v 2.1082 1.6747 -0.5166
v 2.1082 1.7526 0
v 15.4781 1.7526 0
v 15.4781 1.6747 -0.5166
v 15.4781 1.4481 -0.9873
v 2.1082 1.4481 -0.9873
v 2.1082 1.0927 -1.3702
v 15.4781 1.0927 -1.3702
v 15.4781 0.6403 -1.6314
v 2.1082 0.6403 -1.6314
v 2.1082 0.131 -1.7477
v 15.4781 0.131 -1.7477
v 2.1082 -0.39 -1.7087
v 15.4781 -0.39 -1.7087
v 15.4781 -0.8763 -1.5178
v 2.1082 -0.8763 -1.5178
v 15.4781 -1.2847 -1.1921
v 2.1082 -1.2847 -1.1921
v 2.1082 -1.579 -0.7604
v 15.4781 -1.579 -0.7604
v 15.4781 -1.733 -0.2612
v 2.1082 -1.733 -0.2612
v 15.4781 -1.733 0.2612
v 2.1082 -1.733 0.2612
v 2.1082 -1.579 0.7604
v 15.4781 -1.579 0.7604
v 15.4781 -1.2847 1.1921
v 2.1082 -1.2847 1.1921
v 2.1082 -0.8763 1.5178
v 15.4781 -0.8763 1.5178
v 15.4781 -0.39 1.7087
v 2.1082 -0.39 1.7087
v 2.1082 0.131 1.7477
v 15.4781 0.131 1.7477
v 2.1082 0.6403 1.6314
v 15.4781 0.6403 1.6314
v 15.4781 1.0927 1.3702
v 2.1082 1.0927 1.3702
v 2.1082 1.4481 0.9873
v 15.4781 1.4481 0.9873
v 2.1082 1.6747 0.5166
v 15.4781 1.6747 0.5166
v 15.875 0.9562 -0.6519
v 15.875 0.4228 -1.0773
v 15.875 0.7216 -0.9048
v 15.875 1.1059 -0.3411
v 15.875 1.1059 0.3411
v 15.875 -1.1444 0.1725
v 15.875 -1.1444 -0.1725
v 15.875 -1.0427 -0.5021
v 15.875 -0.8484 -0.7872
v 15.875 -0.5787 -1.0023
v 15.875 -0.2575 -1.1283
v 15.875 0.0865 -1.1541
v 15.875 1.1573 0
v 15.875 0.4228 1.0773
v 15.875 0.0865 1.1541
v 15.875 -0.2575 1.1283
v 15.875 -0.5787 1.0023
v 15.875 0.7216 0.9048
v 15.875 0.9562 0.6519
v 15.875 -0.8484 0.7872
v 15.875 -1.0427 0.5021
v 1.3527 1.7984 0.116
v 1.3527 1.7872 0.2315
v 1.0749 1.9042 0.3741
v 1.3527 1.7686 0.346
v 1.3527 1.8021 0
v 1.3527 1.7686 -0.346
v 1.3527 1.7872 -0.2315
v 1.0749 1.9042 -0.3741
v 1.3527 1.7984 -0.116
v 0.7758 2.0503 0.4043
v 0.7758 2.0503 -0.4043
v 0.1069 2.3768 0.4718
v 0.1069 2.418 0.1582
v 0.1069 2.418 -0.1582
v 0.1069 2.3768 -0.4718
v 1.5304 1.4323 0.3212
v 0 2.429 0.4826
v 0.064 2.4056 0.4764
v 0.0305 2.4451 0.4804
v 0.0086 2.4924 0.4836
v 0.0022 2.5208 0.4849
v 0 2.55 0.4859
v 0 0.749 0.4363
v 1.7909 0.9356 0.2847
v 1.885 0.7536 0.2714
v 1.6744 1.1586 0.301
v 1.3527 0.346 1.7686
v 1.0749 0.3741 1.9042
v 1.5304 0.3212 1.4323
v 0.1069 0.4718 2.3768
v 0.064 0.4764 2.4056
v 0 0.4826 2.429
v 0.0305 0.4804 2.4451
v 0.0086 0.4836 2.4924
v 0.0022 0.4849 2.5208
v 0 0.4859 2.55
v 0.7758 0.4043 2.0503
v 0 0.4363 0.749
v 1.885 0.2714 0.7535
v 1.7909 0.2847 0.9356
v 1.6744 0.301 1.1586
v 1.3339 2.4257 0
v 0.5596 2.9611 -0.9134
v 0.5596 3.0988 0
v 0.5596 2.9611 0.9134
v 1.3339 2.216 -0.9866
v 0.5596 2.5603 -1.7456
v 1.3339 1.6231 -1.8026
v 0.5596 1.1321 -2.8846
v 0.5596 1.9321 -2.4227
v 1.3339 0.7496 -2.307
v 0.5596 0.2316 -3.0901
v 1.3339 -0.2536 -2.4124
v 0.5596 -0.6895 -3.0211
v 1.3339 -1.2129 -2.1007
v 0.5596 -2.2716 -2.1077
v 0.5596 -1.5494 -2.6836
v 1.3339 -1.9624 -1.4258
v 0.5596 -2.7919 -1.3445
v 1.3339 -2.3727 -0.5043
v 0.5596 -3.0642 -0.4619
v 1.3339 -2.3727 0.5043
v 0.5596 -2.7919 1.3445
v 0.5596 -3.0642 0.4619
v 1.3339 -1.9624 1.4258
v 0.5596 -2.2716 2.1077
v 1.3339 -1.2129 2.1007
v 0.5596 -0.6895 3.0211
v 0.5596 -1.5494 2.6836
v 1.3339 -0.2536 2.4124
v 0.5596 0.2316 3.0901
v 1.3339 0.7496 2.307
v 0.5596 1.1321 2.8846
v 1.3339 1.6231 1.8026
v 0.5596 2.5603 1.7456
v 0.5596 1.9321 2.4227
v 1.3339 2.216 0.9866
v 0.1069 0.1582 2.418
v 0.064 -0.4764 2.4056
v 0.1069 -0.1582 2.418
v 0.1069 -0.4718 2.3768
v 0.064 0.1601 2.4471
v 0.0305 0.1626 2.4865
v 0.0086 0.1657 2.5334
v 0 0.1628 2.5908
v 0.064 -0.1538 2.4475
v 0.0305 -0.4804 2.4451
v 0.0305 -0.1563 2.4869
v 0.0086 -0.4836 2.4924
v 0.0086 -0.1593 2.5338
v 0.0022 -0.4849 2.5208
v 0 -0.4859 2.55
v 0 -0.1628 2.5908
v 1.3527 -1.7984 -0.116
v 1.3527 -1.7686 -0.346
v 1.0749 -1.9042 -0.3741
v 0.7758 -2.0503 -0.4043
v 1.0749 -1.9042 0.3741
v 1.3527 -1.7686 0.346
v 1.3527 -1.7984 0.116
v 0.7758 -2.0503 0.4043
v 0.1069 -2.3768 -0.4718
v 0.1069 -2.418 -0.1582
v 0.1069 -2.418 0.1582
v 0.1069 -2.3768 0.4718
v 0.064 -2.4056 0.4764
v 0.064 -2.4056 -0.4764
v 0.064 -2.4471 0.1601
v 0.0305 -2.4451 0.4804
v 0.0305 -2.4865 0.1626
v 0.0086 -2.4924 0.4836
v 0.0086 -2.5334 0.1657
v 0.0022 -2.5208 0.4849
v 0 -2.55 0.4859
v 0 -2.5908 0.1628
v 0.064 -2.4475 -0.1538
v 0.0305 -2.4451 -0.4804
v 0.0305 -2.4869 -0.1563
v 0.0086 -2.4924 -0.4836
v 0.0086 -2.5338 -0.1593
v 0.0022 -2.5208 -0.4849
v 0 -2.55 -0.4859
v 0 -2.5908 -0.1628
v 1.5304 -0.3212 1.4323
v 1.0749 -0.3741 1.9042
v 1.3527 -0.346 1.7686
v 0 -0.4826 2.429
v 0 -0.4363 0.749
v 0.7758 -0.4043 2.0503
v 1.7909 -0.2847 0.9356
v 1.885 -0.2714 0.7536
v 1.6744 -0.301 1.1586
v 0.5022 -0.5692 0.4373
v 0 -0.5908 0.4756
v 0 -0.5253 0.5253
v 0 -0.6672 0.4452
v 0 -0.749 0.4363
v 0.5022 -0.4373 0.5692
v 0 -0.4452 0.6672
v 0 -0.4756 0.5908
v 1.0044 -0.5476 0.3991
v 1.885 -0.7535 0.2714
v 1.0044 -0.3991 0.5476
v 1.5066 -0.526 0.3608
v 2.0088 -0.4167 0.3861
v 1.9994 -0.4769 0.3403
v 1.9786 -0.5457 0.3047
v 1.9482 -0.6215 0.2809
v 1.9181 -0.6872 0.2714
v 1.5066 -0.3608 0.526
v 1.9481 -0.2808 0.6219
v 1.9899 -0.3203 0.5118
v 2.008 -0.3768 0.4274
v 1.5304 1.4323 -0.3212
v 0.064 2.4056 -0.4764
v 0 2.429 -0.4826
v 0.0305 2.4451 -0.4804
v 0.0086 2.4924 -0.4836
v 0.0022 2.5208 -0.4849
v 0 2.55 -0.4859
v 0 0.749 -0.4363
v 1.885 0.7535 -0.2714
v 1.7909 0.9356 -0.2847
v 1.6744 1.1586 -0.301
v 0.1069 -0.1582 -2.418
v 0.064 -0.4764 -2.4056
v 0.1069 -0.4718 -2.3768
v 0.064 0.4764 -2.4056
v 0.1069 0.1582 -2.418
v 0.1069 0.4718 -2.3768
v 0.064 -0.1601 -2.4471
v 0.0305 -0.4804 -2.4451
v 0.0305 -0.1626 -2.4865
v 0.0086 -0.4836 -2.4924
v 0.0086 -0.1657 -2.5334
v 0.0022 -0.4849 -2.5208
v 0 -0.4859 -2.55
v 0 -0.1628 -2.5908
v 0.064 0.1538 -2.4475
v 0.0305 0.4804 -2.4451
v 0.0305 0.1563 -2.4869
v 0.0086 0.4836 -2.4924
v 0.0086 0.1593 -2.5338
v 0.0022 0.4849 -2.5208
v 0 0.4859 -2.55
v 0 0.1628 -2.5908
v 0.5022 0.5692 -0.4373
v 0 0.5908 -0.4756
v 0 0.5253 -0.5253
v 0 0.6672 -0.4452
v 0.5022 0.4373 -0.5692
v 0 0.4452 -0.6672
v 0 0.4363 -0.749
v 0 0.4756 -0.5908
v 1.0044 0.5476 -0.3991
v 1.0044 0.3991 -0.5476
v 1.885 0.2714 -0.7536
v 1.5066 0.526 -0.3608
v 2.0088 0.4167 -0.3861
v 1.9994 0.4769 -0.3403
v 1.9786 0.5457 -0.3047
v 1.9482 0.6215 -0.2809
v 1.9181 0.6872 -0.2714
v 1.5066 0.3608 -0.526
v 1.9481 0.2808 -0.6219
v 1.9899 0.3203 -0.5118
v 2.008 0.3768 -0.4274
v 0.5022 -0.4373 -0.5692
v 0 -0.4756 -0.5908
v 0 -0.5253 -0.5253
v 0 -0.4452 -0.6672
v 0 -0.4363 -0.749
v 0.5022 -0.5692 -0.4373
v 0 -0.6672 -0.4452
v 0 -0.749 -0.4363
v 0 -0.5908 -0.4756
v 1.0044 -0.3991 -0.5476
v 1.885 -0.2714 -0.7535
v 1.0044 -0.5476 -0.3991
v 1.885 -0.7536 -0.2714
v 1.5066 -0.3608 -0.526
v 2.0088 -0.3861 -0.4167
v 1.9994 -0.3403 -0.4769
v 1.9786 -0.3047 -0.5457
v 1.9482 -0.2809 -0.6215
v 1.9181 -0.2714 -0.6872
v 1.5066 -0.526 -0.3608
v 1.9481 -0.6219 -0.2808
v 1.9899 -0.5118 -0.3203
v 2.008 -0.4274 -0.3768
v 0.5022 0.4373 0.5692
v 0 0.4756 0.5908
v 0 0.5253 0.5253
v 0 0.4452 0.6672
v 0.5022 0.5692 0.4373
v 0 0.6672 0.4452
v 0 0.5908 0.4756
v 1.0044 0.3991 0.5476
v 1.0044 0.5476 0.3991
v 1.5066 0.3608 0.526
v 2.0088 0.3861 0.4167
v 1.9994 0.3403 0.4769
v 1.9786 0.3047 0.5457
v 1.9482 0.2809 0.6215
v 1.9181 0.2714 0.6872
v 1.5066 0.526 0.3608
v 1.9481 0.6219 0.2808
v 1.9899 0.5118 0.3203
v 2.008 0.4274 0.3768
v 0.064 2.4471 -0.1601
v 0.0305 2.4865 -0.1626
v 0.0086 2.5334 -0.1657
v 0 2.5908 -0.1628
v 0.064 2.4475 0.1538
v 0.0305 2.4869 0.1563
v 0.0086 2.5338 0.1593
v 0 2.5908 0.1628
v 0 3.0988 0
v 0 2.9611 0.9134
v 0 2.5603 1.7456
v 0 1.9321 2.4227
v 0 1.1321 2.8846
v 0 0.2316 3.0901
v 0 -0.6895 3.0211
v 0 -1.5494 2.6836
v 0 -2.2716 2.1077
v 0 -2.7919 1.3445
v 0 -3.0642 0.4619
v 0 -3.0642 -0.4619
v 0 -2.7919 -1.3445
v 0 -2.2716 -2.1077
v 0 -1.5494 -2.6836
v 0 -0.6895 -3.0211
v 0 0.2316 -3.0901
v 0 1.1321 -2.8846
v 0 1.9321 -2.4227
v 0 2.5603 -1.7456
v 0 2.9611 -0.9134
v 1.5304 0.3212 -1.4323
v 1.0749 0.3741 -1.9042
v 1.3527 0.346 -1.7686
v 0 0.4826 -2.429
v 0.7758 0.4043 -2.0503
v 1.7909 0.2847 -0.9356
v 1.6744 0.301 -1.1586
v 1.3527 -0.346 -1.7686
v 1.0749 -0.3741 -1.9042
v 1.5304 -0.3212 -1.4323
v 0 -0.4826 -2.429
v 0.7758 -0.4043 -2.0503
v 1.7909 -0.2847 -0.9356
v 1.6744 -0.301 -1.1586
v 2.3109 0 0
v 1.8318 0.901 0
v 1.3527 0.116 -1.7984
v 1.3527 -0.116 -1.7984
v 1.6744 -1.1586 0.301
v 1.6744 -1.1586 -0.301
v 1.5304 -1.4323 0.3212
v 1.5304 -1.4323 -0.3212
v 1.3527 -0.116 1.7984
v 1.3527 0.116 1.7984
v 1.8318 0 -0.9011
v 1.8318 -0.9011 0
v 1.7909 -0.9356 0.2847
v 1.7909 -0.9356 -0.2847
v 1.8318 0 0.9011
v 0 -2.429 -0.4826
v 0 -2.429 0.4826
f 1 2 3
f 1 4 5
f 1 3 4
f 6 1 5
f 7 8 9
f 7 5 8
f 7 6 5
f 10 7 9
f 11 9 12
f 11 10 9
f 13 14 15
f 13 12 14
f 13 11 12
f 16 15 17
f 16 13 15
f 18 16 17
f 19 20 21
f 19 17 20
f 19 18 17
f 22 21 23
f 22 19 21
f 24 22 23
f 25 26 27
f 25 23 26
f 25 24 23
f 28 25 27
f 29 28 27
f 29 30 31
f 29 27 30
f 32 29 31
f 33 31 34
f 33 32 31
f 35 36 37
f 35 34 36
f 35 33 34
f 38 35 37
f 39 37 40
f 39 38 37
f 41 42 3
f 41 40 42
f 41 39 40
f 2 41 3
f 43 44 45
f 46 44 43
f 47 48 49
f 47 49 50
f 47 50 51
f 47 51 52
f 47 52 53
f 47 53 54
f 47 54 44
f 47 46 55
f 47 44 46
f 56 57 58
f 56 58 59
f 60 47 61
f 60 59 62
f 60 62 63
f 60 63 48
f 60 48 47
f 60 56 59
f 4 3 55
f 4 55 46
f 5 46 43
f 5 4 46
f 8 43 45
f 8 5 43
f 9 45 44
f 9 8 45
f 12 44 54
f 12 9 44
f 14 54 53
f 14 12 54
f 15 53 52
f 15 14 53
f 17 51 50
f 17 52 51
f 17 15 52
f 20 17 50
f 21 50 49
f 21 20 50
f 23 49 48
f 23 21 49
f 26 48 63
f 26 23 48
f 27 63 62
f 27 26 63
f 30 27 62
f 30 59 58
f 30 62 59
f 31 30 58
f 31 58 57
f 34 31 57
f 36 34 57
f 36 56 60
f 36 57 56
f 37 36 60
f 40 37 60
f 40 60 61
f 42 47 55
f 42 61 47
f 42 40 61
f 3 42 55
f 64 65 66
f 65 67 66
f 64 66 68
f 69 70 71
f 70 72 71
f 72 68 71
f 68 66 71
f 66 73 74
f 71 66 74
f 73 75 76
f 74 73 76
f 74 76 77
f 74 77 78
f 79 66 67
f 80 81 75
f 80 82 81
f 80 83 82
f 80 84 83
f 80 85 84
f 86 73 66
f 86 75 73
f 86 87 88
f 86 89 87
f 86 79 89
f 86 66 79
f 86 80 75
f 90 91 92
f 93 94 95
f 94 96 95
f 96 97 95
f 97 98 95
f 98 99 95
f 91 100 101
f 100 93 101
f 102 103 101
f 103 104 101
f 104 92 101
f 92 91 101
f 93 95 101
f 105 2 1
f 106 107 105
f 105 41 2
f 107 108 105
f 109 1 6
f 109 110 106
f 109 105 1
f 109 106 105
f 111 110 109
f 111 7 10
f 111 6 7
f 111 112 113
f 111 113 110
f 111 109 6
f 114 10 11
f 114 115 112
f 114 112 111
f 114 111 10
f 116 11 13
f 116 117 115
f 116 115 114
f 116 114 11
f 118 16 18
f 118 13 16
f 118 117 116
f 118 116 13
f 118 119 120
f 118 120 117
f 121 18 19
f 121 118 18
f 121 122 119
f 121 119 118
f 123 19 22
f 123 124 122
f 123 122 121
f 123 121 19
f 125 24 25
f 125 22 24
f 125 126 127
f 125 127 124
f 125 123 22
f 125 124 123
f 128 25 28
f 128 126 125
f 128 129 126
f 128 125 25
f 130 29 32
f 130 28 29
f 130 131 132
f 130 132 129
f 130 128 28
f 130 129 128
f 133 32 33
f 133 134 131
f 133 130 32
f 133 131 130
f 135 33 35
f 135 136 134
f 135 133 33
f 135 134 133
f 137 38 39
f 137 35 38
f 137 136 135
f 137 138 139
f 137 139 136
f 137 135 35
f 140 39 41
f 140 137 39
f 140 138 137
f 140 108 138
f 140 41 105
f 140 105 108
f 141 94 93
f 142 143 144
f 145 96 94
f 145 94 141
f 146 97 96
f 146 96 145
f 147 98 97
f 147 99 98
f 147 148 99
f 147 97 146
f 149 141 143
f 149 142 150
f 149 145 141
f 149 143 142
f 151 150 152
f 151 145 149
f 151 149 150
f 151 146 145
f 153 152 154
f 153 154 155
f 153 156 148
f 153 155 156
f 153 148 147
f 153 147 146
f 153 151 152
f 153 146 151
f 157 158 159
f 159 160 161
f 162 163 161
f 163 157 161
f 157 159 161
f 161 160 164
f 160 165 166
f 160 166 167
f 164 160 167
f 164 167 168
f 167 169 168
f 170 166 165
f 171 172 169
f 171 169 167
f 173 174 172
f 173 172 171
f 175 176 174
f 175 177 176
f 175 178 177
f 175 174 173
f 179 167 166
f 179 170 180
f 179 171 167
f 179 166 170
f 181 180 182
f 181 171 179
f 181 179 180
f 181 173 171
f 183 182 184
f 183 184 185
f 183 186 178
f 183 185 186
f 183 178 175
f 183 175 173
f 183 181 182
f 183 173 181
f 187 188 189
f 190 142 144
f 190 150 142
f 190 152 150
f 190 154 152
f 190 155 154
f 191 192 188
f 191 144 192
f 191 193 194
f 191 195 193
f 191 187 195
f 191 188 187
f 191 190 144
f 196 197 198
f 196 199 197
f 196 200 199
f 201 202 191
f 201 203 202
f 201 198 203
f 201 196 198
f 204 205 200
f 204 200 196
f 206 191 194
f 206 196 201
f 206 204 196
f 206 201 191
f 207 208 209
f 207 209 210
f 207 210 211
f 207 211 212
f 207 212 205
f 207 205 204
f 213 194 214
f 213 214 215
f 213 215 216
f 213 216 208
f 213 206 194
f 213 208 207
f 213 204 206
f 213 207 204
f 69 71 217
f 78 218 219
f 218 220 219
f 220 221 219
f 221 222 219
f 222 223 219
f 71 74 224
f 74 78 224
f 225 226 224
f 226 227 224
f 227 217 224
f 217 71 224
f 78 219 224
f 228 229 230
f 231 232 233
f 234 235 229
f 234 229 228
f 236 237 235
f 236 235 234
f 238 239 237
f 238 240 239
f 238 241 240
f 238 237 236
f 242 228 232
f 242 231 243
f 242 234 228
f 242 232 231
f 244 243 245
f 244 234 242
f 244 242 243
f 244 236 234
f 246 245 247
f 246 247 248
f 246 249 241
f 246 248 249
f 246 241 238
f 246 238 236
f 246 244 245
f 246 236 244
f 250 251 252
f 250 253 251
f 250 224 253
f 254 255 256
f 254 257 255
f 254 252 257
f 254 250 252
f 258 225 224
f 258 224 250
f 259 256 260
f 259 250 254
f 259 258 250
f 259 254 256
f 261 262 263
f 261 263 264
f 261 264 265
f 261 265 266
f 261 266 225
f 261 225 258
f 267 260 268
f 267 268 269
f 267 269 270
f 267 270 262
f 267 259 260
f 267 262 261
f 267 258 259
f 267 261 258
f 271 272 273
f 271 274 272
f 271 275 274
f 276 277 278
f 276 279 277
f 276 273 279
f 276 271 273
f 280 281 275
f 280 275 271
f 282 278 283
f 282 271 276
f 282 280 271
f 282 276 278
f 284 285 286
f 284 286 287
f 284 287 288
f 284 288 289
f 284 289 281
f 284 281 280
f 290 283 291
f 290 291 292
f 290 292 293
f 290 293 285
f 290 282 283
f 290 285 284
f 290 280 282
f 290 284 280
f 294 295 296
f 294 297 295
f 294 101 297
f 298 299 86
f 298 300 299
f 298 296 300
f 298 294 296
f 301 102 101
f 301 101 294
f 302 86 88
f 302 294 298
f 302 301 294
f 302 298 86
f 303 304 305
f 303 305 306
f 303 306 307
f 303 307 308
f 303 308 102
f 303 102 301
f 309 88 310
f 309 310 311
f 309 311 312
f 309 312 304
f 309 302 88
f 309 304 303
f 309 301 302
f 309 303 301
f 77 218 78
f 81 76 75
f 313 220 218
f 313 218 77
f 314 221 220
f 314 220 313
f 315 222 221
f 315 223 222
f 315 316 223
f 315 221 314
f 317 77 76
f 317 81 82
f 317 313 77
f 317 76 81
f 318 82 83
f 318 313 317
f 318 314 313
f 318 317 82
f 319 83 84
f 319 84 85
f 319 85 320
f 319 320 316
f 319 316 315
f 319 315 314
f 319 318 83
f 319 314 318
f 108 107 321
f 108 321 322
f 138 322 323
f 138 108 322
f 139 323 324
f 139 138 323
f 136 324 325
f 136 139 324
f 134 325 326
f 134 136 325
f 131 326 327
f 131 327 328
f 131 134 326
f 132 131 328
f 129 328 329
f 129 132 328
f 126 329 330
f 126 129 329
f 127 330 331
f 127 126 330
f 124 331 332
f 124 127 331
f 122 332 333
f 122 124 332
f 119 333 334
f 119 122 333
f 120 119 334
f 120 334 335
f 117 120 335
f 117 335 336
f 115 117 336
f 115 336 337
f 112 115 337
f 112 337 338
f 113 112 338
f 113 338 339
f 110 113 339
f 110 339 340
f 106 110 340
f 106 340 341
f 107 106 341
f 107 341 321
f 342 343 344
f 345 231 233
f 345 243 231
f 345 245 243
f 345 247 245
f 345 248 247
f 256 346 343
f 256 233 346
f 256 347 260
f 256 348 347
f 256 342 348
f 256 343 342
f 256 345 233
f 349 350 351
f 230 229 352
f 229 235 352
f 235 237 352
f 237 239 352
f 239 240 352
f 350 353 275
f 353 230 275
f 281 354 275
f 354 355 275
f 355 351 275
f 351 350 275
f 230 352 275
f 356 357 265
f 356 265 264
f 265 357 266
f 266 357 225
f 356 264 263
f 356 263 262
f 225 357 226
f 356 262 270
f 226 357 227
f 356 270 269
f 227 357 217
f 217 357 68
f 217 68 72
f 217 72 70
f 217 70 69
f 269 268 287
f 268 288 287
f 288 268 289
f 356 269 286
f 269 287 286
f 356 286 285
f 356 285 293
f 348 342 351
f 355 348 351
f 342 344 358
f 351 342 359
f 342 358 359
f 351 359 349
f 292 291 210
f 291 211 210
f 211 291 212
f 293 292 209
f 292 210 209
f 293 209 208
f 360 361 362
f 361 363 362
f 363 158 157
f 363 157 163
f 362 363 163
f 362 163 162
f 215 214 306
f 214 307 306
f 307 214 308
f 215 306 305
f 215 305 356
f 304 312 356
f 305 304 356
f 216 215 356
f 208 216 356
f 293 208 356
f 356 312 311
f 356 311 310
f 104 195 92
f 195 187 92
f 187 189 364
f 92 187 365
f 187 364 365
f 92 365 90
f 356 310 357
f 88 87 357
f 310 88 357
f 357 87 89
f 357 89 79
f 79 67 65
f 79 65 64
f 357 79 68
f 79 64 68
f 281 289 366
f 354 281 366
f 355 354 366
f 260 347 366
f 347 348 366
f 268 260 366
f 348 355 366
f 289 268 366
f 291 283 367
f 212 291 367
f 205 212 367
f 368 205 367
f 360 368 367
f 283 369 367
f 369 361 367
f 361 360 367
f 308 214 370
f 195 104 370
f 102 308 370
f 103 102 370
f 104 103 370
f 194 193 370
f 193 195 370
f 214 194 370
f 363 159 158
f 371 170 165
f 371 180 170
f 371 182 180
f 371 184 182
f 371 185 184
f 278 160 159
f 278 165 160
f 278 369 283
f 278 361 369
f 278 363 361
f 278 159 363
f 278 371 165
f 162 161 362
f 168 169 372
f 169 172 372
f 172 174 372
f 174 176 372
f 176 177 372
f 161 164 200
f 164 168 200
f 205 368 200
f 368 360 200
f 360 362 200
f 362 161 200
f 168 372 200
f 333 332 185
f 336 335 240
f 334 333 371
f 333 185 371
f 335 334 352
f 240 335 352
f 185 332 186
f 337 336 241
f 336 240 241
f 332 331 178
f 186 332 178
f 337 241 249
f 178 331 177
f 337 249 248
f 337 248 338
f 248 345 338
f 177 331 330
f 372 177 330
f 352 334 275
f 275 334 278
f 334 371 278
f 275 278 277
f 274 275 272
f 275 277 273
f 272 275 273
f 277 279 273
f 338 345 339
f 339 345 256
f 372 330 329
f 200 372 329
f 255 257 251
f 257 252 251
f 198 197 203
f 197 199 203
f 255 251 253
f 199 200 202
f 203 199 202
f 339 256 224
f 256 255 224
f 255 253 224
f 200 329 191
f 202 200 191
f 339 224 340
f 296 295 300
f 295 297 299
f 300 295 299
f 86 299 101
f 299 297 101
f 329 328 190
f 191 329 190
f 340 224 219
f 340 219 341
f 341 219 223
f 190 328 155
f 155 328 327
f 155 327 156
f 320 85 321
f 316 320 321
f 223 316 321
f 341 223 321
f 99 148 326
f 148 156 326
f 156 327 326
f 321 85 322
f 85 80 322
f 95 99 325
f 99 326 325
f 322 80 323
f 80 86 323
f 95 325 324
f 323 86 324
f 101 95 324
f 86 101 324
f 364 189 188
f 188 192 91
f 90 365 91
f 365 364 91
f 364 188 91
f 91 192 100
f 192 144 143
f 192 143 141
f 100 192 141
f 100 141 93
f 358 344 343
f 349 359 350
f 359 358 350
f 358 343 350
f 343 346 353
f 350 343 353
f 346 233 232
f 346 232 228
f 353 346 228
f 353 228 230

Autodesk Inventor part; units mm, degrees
ref_plane "YZ Plane" through (0, 0, 0) normal (1, 0, 0) x (0, 1, 0)
ref_plane "XZ Plane" through (0, 0, 0) normal (0, 1, 0) x (-1, 0, 0)
sketch "Sketch1" plane through (0, 0, 0) normal (0, 0, 1) x (1, 0, 0)
  line L0 (2.3109, 0) -> (15.875, 0)
  line L1 (15.875, 0) -> (15.875, 1.7526)
  line L2 (15.875, 1.7526) -> (4.0926, 1.7526)
  line L3 (4.0926, 1.7526) -> (3.2988, 1.7526)
  line L4 (3.2988, 1.7526) -> (2.1082, 1.7526)
  line L5 (0, 3.0988) -> (0, 2.4765)
  line L6 (0, 2.4765) -> (1.3527, 1.8021)
  line L7 (1.3527, 1.8021) -> (2.3109, 0)
  line L8 (-3.175, 0) -> (19.05, 0) projected
  line L9 (0, -0.6198) -> (0, 3.7186) projected
  line L10 (0, 3.0988) -> (0.5596, 3.0988)
  line L11 (0.5596, 3.0988) -> (2.1082, 1.7526)
  line L12 (4.0926, 1.7526) -> (2.1082, 1.7526) construction
  dimension "d1" = 11.7824
  dimension "d2" = 3.5052
  dimension "d3" = 3.5052
  dimension "d4" = 4.953
  dimension "d5" = 26.5
  dimension "d6" = 62
  dimension "d7" = 2.3109
  dimension "d8" = 0.7937
  dimension "d12" = 6.1976
  dimension "d13" = 41
  dimension "d15" = 15.875
  dimension "d24" = 2.1082
revolve "Body" add sketch "Sketch1" angle 360 about axis through (2.3109, 0, 0) along (1, 0, 0) contours L7 L6 L5 L10 L11 L4 L3 L2 L1 L0
sketch "Sketch2" plane through (0, 0, 0) normal (-1, 0, 0) x (0, 0, 1)
  line L0 (0, 2.4765) -> (0, 0) construction
  line L1 (0, 0) -> (2.4765, 0) construction
  arc A0 (0.743, 0) -> (0, 0.7429) centre (0, 0) ccw construction
  arc A1 (0.8668, 0) -> (0, 0.8668) centre (0, 0) ccw construction
  arc A2 (2.429, 0.4826) -> (0.4826, 2.429) centre (0, 0) ccw
  line L2 (0, 0) -> (1.7511, 1.7511) construction
  line L3 (0.4826, 2.429) -> (0.4363, 0.749)
  line L4 (2.429, 0.4826) -> (0.749, 0.4363)
  arc A3 (0.4826, 2.429) -> (0, 2.4765) centre (0, 0) ccw
  arc A4 (2.4765, 0) -> (2.429, 0.4826) centre (0, 0) ccw
  line L5 (0, -4.3383) -> (0, 4.3383) projected
  line L6 (-4.3383, 0) -> (4.3383, 0) projected
  arc A5 (0.4826, -2.429) -> (2.429, -0.4826) centre (0, 0) ccw
  line L7 (0.4826, -2.429) -> (0.4363, -0.749)
  line L8 (2.429, -0.4826) -> (0.749, -0.4363)
  arc A6 (0, -2.4765) -> (0.4826, -2.429) centre (0, 0) ccw
  arc A7 (2.429, -0.4826) -> (2.4765, 0) centre (0, 0) ccw
  arc A8 (-0.4826, 2.429) -> (-2.429, 0.4826) centre (0, 0) ccw
  line L9 (-0.4826, 2.429) -> (-0.4363, 0.749)
  line L10 (-2.429, 0.4826) -> (-0.749, 0.4363)
  arc A9 (0, 2.4765) -> (-0.4826, 2.429) centre (0, 0) ccw
  arc A10 (-2.429, 0.4826) -> (-2.4765, 0) centre (0, 0) ccw
  arc A11 (-0.4826, -2.429) -> (0, -2.4765) centre (0, 0) ccw
  arc A12 (-2.429, -0.4826) -> (-0.4826, -2.429) centre (0, 0) ccw
  arc A13 (-2.4765, 0) -> (-2.429, -0.4826) centre (0, 0) ccw
  line L11 (-2.429, -0.4826) -> (-0.749, -0.4363)
  line L12 (-0.4826, -2.429) -> (-0.4363, -0.749)
  arc A14 (0.4363, 0.749) -> (0.749, 0.4363) centre (0.7406, 0.7406) ccw
  arc A15 (0.749, -0.4363) -> (0.4363, -0.749) centre (0.7406, -0.7406) ccw
  arc A16 (-0.749, 0.4363) -> (-0.4363, 0.749) centre (-0.7406, 0.7406) ccw
  arc A17 (-0.4363, -0.749) -> (-0.749, -0.4363) centre (-0.7406, -0.7406) ccw
  point P0 (1.7511, -1.7511)
  point P1 (-1.7511, 1.7511)
  point P2 (-1.7511, -1.7511)
  dimension "d17" = 1.4859
  dimension "d18" = 1.7335
  dimension "d19" = 4.953
  dimension "d20" = 45
  dimension "d21" = 0.4826
extrude "Slot" add sketch "Sketch2" against normal up to next draft 5 contours L4 A14 L3 A2 | A5 L7 A15 L8 | L9 A16 L10 A8 | A12 L11 A17 L12
fillet "Fillet1" radius 0.193 4 edges at (0, 2.4765, 0) (0, 0, -2.4765) (0, -2.4765, 0) (0, 0, 2.4765)
thread "Thread" size "6-32 UNC" class "2A" standard "ANSI Unified Screw Threads" length 11.7824
chamfer "Chamfer1" distance 0.5953 distance2 0.3969 1 edges at (15.875, -1.7526, 0) measured on face at (15.875, 0.1597, 0.4211)
ref_plane "Work Plane2" through (3.35, 0, 0) normal (0, 0, -1) x (1, 0, 0)
equation "\"d1\" = GEL"
equation "\"d2\" = GD"
equation "\"d3\" = BDM"
equation "\"d4\" = SDM"
equation "\"d7\" = INTI"
equation "\"d8\" = GAL"
equation "\"d12\" = KOD"
equation "\"d13\" = 0.5 * SEWI"
equation "\"d15\" = NLG"
equation "\"d24\" = KOH"
equation "\"d17\" = 0.3 * SDM"
equation "\"d18\" = 0.35 * SDM"
equation "\"d19\" = SDM"
equation "\"d21\" = 0.5 * SBR"
equation "\"d23\" = 0.2 * SBR"
equation "\"d10\" = GEL"
equation "\"d25\" = -0.5 * SPD + 0.5 * GD"
equation "\"d26\" = 0.5 * GAL"
equation "\"NLG\" = 15.875"
equation "\"GEL\" = 11.78242"
equation "\"GAL\" = 0.79375"
equation "\"SPD\" = 2.31458"
equation "\"KOD\" = 6.1976"
equation "\"KOH\" = 2.1082"
equation "\"SBR\" = 0.9652"
equation "\"SDM\" = 4.953"
equation "\"GD\" = NND"
equation "\"BDM\" = NND"
equation "\"SEWI\" = 82deg"
equation "\"d9\" = SDM"
equation "\"GUL\" = 0.75 * GAL"
equation "\"TOA\" = 30deg"
equation "\"THREADDIA\" = 3.5052"
equation "\"NND\" = 3.5052"
equation "\"INTI1\" = 2.8702"
equation "\"GD1\" = SPD"
equation "\"INTI\" = 2.310879"
properties part number "ANSI B18.6.3 - 6-32 x 5/8, CRFCHMSTII(3)" material "Steel, Mild"
